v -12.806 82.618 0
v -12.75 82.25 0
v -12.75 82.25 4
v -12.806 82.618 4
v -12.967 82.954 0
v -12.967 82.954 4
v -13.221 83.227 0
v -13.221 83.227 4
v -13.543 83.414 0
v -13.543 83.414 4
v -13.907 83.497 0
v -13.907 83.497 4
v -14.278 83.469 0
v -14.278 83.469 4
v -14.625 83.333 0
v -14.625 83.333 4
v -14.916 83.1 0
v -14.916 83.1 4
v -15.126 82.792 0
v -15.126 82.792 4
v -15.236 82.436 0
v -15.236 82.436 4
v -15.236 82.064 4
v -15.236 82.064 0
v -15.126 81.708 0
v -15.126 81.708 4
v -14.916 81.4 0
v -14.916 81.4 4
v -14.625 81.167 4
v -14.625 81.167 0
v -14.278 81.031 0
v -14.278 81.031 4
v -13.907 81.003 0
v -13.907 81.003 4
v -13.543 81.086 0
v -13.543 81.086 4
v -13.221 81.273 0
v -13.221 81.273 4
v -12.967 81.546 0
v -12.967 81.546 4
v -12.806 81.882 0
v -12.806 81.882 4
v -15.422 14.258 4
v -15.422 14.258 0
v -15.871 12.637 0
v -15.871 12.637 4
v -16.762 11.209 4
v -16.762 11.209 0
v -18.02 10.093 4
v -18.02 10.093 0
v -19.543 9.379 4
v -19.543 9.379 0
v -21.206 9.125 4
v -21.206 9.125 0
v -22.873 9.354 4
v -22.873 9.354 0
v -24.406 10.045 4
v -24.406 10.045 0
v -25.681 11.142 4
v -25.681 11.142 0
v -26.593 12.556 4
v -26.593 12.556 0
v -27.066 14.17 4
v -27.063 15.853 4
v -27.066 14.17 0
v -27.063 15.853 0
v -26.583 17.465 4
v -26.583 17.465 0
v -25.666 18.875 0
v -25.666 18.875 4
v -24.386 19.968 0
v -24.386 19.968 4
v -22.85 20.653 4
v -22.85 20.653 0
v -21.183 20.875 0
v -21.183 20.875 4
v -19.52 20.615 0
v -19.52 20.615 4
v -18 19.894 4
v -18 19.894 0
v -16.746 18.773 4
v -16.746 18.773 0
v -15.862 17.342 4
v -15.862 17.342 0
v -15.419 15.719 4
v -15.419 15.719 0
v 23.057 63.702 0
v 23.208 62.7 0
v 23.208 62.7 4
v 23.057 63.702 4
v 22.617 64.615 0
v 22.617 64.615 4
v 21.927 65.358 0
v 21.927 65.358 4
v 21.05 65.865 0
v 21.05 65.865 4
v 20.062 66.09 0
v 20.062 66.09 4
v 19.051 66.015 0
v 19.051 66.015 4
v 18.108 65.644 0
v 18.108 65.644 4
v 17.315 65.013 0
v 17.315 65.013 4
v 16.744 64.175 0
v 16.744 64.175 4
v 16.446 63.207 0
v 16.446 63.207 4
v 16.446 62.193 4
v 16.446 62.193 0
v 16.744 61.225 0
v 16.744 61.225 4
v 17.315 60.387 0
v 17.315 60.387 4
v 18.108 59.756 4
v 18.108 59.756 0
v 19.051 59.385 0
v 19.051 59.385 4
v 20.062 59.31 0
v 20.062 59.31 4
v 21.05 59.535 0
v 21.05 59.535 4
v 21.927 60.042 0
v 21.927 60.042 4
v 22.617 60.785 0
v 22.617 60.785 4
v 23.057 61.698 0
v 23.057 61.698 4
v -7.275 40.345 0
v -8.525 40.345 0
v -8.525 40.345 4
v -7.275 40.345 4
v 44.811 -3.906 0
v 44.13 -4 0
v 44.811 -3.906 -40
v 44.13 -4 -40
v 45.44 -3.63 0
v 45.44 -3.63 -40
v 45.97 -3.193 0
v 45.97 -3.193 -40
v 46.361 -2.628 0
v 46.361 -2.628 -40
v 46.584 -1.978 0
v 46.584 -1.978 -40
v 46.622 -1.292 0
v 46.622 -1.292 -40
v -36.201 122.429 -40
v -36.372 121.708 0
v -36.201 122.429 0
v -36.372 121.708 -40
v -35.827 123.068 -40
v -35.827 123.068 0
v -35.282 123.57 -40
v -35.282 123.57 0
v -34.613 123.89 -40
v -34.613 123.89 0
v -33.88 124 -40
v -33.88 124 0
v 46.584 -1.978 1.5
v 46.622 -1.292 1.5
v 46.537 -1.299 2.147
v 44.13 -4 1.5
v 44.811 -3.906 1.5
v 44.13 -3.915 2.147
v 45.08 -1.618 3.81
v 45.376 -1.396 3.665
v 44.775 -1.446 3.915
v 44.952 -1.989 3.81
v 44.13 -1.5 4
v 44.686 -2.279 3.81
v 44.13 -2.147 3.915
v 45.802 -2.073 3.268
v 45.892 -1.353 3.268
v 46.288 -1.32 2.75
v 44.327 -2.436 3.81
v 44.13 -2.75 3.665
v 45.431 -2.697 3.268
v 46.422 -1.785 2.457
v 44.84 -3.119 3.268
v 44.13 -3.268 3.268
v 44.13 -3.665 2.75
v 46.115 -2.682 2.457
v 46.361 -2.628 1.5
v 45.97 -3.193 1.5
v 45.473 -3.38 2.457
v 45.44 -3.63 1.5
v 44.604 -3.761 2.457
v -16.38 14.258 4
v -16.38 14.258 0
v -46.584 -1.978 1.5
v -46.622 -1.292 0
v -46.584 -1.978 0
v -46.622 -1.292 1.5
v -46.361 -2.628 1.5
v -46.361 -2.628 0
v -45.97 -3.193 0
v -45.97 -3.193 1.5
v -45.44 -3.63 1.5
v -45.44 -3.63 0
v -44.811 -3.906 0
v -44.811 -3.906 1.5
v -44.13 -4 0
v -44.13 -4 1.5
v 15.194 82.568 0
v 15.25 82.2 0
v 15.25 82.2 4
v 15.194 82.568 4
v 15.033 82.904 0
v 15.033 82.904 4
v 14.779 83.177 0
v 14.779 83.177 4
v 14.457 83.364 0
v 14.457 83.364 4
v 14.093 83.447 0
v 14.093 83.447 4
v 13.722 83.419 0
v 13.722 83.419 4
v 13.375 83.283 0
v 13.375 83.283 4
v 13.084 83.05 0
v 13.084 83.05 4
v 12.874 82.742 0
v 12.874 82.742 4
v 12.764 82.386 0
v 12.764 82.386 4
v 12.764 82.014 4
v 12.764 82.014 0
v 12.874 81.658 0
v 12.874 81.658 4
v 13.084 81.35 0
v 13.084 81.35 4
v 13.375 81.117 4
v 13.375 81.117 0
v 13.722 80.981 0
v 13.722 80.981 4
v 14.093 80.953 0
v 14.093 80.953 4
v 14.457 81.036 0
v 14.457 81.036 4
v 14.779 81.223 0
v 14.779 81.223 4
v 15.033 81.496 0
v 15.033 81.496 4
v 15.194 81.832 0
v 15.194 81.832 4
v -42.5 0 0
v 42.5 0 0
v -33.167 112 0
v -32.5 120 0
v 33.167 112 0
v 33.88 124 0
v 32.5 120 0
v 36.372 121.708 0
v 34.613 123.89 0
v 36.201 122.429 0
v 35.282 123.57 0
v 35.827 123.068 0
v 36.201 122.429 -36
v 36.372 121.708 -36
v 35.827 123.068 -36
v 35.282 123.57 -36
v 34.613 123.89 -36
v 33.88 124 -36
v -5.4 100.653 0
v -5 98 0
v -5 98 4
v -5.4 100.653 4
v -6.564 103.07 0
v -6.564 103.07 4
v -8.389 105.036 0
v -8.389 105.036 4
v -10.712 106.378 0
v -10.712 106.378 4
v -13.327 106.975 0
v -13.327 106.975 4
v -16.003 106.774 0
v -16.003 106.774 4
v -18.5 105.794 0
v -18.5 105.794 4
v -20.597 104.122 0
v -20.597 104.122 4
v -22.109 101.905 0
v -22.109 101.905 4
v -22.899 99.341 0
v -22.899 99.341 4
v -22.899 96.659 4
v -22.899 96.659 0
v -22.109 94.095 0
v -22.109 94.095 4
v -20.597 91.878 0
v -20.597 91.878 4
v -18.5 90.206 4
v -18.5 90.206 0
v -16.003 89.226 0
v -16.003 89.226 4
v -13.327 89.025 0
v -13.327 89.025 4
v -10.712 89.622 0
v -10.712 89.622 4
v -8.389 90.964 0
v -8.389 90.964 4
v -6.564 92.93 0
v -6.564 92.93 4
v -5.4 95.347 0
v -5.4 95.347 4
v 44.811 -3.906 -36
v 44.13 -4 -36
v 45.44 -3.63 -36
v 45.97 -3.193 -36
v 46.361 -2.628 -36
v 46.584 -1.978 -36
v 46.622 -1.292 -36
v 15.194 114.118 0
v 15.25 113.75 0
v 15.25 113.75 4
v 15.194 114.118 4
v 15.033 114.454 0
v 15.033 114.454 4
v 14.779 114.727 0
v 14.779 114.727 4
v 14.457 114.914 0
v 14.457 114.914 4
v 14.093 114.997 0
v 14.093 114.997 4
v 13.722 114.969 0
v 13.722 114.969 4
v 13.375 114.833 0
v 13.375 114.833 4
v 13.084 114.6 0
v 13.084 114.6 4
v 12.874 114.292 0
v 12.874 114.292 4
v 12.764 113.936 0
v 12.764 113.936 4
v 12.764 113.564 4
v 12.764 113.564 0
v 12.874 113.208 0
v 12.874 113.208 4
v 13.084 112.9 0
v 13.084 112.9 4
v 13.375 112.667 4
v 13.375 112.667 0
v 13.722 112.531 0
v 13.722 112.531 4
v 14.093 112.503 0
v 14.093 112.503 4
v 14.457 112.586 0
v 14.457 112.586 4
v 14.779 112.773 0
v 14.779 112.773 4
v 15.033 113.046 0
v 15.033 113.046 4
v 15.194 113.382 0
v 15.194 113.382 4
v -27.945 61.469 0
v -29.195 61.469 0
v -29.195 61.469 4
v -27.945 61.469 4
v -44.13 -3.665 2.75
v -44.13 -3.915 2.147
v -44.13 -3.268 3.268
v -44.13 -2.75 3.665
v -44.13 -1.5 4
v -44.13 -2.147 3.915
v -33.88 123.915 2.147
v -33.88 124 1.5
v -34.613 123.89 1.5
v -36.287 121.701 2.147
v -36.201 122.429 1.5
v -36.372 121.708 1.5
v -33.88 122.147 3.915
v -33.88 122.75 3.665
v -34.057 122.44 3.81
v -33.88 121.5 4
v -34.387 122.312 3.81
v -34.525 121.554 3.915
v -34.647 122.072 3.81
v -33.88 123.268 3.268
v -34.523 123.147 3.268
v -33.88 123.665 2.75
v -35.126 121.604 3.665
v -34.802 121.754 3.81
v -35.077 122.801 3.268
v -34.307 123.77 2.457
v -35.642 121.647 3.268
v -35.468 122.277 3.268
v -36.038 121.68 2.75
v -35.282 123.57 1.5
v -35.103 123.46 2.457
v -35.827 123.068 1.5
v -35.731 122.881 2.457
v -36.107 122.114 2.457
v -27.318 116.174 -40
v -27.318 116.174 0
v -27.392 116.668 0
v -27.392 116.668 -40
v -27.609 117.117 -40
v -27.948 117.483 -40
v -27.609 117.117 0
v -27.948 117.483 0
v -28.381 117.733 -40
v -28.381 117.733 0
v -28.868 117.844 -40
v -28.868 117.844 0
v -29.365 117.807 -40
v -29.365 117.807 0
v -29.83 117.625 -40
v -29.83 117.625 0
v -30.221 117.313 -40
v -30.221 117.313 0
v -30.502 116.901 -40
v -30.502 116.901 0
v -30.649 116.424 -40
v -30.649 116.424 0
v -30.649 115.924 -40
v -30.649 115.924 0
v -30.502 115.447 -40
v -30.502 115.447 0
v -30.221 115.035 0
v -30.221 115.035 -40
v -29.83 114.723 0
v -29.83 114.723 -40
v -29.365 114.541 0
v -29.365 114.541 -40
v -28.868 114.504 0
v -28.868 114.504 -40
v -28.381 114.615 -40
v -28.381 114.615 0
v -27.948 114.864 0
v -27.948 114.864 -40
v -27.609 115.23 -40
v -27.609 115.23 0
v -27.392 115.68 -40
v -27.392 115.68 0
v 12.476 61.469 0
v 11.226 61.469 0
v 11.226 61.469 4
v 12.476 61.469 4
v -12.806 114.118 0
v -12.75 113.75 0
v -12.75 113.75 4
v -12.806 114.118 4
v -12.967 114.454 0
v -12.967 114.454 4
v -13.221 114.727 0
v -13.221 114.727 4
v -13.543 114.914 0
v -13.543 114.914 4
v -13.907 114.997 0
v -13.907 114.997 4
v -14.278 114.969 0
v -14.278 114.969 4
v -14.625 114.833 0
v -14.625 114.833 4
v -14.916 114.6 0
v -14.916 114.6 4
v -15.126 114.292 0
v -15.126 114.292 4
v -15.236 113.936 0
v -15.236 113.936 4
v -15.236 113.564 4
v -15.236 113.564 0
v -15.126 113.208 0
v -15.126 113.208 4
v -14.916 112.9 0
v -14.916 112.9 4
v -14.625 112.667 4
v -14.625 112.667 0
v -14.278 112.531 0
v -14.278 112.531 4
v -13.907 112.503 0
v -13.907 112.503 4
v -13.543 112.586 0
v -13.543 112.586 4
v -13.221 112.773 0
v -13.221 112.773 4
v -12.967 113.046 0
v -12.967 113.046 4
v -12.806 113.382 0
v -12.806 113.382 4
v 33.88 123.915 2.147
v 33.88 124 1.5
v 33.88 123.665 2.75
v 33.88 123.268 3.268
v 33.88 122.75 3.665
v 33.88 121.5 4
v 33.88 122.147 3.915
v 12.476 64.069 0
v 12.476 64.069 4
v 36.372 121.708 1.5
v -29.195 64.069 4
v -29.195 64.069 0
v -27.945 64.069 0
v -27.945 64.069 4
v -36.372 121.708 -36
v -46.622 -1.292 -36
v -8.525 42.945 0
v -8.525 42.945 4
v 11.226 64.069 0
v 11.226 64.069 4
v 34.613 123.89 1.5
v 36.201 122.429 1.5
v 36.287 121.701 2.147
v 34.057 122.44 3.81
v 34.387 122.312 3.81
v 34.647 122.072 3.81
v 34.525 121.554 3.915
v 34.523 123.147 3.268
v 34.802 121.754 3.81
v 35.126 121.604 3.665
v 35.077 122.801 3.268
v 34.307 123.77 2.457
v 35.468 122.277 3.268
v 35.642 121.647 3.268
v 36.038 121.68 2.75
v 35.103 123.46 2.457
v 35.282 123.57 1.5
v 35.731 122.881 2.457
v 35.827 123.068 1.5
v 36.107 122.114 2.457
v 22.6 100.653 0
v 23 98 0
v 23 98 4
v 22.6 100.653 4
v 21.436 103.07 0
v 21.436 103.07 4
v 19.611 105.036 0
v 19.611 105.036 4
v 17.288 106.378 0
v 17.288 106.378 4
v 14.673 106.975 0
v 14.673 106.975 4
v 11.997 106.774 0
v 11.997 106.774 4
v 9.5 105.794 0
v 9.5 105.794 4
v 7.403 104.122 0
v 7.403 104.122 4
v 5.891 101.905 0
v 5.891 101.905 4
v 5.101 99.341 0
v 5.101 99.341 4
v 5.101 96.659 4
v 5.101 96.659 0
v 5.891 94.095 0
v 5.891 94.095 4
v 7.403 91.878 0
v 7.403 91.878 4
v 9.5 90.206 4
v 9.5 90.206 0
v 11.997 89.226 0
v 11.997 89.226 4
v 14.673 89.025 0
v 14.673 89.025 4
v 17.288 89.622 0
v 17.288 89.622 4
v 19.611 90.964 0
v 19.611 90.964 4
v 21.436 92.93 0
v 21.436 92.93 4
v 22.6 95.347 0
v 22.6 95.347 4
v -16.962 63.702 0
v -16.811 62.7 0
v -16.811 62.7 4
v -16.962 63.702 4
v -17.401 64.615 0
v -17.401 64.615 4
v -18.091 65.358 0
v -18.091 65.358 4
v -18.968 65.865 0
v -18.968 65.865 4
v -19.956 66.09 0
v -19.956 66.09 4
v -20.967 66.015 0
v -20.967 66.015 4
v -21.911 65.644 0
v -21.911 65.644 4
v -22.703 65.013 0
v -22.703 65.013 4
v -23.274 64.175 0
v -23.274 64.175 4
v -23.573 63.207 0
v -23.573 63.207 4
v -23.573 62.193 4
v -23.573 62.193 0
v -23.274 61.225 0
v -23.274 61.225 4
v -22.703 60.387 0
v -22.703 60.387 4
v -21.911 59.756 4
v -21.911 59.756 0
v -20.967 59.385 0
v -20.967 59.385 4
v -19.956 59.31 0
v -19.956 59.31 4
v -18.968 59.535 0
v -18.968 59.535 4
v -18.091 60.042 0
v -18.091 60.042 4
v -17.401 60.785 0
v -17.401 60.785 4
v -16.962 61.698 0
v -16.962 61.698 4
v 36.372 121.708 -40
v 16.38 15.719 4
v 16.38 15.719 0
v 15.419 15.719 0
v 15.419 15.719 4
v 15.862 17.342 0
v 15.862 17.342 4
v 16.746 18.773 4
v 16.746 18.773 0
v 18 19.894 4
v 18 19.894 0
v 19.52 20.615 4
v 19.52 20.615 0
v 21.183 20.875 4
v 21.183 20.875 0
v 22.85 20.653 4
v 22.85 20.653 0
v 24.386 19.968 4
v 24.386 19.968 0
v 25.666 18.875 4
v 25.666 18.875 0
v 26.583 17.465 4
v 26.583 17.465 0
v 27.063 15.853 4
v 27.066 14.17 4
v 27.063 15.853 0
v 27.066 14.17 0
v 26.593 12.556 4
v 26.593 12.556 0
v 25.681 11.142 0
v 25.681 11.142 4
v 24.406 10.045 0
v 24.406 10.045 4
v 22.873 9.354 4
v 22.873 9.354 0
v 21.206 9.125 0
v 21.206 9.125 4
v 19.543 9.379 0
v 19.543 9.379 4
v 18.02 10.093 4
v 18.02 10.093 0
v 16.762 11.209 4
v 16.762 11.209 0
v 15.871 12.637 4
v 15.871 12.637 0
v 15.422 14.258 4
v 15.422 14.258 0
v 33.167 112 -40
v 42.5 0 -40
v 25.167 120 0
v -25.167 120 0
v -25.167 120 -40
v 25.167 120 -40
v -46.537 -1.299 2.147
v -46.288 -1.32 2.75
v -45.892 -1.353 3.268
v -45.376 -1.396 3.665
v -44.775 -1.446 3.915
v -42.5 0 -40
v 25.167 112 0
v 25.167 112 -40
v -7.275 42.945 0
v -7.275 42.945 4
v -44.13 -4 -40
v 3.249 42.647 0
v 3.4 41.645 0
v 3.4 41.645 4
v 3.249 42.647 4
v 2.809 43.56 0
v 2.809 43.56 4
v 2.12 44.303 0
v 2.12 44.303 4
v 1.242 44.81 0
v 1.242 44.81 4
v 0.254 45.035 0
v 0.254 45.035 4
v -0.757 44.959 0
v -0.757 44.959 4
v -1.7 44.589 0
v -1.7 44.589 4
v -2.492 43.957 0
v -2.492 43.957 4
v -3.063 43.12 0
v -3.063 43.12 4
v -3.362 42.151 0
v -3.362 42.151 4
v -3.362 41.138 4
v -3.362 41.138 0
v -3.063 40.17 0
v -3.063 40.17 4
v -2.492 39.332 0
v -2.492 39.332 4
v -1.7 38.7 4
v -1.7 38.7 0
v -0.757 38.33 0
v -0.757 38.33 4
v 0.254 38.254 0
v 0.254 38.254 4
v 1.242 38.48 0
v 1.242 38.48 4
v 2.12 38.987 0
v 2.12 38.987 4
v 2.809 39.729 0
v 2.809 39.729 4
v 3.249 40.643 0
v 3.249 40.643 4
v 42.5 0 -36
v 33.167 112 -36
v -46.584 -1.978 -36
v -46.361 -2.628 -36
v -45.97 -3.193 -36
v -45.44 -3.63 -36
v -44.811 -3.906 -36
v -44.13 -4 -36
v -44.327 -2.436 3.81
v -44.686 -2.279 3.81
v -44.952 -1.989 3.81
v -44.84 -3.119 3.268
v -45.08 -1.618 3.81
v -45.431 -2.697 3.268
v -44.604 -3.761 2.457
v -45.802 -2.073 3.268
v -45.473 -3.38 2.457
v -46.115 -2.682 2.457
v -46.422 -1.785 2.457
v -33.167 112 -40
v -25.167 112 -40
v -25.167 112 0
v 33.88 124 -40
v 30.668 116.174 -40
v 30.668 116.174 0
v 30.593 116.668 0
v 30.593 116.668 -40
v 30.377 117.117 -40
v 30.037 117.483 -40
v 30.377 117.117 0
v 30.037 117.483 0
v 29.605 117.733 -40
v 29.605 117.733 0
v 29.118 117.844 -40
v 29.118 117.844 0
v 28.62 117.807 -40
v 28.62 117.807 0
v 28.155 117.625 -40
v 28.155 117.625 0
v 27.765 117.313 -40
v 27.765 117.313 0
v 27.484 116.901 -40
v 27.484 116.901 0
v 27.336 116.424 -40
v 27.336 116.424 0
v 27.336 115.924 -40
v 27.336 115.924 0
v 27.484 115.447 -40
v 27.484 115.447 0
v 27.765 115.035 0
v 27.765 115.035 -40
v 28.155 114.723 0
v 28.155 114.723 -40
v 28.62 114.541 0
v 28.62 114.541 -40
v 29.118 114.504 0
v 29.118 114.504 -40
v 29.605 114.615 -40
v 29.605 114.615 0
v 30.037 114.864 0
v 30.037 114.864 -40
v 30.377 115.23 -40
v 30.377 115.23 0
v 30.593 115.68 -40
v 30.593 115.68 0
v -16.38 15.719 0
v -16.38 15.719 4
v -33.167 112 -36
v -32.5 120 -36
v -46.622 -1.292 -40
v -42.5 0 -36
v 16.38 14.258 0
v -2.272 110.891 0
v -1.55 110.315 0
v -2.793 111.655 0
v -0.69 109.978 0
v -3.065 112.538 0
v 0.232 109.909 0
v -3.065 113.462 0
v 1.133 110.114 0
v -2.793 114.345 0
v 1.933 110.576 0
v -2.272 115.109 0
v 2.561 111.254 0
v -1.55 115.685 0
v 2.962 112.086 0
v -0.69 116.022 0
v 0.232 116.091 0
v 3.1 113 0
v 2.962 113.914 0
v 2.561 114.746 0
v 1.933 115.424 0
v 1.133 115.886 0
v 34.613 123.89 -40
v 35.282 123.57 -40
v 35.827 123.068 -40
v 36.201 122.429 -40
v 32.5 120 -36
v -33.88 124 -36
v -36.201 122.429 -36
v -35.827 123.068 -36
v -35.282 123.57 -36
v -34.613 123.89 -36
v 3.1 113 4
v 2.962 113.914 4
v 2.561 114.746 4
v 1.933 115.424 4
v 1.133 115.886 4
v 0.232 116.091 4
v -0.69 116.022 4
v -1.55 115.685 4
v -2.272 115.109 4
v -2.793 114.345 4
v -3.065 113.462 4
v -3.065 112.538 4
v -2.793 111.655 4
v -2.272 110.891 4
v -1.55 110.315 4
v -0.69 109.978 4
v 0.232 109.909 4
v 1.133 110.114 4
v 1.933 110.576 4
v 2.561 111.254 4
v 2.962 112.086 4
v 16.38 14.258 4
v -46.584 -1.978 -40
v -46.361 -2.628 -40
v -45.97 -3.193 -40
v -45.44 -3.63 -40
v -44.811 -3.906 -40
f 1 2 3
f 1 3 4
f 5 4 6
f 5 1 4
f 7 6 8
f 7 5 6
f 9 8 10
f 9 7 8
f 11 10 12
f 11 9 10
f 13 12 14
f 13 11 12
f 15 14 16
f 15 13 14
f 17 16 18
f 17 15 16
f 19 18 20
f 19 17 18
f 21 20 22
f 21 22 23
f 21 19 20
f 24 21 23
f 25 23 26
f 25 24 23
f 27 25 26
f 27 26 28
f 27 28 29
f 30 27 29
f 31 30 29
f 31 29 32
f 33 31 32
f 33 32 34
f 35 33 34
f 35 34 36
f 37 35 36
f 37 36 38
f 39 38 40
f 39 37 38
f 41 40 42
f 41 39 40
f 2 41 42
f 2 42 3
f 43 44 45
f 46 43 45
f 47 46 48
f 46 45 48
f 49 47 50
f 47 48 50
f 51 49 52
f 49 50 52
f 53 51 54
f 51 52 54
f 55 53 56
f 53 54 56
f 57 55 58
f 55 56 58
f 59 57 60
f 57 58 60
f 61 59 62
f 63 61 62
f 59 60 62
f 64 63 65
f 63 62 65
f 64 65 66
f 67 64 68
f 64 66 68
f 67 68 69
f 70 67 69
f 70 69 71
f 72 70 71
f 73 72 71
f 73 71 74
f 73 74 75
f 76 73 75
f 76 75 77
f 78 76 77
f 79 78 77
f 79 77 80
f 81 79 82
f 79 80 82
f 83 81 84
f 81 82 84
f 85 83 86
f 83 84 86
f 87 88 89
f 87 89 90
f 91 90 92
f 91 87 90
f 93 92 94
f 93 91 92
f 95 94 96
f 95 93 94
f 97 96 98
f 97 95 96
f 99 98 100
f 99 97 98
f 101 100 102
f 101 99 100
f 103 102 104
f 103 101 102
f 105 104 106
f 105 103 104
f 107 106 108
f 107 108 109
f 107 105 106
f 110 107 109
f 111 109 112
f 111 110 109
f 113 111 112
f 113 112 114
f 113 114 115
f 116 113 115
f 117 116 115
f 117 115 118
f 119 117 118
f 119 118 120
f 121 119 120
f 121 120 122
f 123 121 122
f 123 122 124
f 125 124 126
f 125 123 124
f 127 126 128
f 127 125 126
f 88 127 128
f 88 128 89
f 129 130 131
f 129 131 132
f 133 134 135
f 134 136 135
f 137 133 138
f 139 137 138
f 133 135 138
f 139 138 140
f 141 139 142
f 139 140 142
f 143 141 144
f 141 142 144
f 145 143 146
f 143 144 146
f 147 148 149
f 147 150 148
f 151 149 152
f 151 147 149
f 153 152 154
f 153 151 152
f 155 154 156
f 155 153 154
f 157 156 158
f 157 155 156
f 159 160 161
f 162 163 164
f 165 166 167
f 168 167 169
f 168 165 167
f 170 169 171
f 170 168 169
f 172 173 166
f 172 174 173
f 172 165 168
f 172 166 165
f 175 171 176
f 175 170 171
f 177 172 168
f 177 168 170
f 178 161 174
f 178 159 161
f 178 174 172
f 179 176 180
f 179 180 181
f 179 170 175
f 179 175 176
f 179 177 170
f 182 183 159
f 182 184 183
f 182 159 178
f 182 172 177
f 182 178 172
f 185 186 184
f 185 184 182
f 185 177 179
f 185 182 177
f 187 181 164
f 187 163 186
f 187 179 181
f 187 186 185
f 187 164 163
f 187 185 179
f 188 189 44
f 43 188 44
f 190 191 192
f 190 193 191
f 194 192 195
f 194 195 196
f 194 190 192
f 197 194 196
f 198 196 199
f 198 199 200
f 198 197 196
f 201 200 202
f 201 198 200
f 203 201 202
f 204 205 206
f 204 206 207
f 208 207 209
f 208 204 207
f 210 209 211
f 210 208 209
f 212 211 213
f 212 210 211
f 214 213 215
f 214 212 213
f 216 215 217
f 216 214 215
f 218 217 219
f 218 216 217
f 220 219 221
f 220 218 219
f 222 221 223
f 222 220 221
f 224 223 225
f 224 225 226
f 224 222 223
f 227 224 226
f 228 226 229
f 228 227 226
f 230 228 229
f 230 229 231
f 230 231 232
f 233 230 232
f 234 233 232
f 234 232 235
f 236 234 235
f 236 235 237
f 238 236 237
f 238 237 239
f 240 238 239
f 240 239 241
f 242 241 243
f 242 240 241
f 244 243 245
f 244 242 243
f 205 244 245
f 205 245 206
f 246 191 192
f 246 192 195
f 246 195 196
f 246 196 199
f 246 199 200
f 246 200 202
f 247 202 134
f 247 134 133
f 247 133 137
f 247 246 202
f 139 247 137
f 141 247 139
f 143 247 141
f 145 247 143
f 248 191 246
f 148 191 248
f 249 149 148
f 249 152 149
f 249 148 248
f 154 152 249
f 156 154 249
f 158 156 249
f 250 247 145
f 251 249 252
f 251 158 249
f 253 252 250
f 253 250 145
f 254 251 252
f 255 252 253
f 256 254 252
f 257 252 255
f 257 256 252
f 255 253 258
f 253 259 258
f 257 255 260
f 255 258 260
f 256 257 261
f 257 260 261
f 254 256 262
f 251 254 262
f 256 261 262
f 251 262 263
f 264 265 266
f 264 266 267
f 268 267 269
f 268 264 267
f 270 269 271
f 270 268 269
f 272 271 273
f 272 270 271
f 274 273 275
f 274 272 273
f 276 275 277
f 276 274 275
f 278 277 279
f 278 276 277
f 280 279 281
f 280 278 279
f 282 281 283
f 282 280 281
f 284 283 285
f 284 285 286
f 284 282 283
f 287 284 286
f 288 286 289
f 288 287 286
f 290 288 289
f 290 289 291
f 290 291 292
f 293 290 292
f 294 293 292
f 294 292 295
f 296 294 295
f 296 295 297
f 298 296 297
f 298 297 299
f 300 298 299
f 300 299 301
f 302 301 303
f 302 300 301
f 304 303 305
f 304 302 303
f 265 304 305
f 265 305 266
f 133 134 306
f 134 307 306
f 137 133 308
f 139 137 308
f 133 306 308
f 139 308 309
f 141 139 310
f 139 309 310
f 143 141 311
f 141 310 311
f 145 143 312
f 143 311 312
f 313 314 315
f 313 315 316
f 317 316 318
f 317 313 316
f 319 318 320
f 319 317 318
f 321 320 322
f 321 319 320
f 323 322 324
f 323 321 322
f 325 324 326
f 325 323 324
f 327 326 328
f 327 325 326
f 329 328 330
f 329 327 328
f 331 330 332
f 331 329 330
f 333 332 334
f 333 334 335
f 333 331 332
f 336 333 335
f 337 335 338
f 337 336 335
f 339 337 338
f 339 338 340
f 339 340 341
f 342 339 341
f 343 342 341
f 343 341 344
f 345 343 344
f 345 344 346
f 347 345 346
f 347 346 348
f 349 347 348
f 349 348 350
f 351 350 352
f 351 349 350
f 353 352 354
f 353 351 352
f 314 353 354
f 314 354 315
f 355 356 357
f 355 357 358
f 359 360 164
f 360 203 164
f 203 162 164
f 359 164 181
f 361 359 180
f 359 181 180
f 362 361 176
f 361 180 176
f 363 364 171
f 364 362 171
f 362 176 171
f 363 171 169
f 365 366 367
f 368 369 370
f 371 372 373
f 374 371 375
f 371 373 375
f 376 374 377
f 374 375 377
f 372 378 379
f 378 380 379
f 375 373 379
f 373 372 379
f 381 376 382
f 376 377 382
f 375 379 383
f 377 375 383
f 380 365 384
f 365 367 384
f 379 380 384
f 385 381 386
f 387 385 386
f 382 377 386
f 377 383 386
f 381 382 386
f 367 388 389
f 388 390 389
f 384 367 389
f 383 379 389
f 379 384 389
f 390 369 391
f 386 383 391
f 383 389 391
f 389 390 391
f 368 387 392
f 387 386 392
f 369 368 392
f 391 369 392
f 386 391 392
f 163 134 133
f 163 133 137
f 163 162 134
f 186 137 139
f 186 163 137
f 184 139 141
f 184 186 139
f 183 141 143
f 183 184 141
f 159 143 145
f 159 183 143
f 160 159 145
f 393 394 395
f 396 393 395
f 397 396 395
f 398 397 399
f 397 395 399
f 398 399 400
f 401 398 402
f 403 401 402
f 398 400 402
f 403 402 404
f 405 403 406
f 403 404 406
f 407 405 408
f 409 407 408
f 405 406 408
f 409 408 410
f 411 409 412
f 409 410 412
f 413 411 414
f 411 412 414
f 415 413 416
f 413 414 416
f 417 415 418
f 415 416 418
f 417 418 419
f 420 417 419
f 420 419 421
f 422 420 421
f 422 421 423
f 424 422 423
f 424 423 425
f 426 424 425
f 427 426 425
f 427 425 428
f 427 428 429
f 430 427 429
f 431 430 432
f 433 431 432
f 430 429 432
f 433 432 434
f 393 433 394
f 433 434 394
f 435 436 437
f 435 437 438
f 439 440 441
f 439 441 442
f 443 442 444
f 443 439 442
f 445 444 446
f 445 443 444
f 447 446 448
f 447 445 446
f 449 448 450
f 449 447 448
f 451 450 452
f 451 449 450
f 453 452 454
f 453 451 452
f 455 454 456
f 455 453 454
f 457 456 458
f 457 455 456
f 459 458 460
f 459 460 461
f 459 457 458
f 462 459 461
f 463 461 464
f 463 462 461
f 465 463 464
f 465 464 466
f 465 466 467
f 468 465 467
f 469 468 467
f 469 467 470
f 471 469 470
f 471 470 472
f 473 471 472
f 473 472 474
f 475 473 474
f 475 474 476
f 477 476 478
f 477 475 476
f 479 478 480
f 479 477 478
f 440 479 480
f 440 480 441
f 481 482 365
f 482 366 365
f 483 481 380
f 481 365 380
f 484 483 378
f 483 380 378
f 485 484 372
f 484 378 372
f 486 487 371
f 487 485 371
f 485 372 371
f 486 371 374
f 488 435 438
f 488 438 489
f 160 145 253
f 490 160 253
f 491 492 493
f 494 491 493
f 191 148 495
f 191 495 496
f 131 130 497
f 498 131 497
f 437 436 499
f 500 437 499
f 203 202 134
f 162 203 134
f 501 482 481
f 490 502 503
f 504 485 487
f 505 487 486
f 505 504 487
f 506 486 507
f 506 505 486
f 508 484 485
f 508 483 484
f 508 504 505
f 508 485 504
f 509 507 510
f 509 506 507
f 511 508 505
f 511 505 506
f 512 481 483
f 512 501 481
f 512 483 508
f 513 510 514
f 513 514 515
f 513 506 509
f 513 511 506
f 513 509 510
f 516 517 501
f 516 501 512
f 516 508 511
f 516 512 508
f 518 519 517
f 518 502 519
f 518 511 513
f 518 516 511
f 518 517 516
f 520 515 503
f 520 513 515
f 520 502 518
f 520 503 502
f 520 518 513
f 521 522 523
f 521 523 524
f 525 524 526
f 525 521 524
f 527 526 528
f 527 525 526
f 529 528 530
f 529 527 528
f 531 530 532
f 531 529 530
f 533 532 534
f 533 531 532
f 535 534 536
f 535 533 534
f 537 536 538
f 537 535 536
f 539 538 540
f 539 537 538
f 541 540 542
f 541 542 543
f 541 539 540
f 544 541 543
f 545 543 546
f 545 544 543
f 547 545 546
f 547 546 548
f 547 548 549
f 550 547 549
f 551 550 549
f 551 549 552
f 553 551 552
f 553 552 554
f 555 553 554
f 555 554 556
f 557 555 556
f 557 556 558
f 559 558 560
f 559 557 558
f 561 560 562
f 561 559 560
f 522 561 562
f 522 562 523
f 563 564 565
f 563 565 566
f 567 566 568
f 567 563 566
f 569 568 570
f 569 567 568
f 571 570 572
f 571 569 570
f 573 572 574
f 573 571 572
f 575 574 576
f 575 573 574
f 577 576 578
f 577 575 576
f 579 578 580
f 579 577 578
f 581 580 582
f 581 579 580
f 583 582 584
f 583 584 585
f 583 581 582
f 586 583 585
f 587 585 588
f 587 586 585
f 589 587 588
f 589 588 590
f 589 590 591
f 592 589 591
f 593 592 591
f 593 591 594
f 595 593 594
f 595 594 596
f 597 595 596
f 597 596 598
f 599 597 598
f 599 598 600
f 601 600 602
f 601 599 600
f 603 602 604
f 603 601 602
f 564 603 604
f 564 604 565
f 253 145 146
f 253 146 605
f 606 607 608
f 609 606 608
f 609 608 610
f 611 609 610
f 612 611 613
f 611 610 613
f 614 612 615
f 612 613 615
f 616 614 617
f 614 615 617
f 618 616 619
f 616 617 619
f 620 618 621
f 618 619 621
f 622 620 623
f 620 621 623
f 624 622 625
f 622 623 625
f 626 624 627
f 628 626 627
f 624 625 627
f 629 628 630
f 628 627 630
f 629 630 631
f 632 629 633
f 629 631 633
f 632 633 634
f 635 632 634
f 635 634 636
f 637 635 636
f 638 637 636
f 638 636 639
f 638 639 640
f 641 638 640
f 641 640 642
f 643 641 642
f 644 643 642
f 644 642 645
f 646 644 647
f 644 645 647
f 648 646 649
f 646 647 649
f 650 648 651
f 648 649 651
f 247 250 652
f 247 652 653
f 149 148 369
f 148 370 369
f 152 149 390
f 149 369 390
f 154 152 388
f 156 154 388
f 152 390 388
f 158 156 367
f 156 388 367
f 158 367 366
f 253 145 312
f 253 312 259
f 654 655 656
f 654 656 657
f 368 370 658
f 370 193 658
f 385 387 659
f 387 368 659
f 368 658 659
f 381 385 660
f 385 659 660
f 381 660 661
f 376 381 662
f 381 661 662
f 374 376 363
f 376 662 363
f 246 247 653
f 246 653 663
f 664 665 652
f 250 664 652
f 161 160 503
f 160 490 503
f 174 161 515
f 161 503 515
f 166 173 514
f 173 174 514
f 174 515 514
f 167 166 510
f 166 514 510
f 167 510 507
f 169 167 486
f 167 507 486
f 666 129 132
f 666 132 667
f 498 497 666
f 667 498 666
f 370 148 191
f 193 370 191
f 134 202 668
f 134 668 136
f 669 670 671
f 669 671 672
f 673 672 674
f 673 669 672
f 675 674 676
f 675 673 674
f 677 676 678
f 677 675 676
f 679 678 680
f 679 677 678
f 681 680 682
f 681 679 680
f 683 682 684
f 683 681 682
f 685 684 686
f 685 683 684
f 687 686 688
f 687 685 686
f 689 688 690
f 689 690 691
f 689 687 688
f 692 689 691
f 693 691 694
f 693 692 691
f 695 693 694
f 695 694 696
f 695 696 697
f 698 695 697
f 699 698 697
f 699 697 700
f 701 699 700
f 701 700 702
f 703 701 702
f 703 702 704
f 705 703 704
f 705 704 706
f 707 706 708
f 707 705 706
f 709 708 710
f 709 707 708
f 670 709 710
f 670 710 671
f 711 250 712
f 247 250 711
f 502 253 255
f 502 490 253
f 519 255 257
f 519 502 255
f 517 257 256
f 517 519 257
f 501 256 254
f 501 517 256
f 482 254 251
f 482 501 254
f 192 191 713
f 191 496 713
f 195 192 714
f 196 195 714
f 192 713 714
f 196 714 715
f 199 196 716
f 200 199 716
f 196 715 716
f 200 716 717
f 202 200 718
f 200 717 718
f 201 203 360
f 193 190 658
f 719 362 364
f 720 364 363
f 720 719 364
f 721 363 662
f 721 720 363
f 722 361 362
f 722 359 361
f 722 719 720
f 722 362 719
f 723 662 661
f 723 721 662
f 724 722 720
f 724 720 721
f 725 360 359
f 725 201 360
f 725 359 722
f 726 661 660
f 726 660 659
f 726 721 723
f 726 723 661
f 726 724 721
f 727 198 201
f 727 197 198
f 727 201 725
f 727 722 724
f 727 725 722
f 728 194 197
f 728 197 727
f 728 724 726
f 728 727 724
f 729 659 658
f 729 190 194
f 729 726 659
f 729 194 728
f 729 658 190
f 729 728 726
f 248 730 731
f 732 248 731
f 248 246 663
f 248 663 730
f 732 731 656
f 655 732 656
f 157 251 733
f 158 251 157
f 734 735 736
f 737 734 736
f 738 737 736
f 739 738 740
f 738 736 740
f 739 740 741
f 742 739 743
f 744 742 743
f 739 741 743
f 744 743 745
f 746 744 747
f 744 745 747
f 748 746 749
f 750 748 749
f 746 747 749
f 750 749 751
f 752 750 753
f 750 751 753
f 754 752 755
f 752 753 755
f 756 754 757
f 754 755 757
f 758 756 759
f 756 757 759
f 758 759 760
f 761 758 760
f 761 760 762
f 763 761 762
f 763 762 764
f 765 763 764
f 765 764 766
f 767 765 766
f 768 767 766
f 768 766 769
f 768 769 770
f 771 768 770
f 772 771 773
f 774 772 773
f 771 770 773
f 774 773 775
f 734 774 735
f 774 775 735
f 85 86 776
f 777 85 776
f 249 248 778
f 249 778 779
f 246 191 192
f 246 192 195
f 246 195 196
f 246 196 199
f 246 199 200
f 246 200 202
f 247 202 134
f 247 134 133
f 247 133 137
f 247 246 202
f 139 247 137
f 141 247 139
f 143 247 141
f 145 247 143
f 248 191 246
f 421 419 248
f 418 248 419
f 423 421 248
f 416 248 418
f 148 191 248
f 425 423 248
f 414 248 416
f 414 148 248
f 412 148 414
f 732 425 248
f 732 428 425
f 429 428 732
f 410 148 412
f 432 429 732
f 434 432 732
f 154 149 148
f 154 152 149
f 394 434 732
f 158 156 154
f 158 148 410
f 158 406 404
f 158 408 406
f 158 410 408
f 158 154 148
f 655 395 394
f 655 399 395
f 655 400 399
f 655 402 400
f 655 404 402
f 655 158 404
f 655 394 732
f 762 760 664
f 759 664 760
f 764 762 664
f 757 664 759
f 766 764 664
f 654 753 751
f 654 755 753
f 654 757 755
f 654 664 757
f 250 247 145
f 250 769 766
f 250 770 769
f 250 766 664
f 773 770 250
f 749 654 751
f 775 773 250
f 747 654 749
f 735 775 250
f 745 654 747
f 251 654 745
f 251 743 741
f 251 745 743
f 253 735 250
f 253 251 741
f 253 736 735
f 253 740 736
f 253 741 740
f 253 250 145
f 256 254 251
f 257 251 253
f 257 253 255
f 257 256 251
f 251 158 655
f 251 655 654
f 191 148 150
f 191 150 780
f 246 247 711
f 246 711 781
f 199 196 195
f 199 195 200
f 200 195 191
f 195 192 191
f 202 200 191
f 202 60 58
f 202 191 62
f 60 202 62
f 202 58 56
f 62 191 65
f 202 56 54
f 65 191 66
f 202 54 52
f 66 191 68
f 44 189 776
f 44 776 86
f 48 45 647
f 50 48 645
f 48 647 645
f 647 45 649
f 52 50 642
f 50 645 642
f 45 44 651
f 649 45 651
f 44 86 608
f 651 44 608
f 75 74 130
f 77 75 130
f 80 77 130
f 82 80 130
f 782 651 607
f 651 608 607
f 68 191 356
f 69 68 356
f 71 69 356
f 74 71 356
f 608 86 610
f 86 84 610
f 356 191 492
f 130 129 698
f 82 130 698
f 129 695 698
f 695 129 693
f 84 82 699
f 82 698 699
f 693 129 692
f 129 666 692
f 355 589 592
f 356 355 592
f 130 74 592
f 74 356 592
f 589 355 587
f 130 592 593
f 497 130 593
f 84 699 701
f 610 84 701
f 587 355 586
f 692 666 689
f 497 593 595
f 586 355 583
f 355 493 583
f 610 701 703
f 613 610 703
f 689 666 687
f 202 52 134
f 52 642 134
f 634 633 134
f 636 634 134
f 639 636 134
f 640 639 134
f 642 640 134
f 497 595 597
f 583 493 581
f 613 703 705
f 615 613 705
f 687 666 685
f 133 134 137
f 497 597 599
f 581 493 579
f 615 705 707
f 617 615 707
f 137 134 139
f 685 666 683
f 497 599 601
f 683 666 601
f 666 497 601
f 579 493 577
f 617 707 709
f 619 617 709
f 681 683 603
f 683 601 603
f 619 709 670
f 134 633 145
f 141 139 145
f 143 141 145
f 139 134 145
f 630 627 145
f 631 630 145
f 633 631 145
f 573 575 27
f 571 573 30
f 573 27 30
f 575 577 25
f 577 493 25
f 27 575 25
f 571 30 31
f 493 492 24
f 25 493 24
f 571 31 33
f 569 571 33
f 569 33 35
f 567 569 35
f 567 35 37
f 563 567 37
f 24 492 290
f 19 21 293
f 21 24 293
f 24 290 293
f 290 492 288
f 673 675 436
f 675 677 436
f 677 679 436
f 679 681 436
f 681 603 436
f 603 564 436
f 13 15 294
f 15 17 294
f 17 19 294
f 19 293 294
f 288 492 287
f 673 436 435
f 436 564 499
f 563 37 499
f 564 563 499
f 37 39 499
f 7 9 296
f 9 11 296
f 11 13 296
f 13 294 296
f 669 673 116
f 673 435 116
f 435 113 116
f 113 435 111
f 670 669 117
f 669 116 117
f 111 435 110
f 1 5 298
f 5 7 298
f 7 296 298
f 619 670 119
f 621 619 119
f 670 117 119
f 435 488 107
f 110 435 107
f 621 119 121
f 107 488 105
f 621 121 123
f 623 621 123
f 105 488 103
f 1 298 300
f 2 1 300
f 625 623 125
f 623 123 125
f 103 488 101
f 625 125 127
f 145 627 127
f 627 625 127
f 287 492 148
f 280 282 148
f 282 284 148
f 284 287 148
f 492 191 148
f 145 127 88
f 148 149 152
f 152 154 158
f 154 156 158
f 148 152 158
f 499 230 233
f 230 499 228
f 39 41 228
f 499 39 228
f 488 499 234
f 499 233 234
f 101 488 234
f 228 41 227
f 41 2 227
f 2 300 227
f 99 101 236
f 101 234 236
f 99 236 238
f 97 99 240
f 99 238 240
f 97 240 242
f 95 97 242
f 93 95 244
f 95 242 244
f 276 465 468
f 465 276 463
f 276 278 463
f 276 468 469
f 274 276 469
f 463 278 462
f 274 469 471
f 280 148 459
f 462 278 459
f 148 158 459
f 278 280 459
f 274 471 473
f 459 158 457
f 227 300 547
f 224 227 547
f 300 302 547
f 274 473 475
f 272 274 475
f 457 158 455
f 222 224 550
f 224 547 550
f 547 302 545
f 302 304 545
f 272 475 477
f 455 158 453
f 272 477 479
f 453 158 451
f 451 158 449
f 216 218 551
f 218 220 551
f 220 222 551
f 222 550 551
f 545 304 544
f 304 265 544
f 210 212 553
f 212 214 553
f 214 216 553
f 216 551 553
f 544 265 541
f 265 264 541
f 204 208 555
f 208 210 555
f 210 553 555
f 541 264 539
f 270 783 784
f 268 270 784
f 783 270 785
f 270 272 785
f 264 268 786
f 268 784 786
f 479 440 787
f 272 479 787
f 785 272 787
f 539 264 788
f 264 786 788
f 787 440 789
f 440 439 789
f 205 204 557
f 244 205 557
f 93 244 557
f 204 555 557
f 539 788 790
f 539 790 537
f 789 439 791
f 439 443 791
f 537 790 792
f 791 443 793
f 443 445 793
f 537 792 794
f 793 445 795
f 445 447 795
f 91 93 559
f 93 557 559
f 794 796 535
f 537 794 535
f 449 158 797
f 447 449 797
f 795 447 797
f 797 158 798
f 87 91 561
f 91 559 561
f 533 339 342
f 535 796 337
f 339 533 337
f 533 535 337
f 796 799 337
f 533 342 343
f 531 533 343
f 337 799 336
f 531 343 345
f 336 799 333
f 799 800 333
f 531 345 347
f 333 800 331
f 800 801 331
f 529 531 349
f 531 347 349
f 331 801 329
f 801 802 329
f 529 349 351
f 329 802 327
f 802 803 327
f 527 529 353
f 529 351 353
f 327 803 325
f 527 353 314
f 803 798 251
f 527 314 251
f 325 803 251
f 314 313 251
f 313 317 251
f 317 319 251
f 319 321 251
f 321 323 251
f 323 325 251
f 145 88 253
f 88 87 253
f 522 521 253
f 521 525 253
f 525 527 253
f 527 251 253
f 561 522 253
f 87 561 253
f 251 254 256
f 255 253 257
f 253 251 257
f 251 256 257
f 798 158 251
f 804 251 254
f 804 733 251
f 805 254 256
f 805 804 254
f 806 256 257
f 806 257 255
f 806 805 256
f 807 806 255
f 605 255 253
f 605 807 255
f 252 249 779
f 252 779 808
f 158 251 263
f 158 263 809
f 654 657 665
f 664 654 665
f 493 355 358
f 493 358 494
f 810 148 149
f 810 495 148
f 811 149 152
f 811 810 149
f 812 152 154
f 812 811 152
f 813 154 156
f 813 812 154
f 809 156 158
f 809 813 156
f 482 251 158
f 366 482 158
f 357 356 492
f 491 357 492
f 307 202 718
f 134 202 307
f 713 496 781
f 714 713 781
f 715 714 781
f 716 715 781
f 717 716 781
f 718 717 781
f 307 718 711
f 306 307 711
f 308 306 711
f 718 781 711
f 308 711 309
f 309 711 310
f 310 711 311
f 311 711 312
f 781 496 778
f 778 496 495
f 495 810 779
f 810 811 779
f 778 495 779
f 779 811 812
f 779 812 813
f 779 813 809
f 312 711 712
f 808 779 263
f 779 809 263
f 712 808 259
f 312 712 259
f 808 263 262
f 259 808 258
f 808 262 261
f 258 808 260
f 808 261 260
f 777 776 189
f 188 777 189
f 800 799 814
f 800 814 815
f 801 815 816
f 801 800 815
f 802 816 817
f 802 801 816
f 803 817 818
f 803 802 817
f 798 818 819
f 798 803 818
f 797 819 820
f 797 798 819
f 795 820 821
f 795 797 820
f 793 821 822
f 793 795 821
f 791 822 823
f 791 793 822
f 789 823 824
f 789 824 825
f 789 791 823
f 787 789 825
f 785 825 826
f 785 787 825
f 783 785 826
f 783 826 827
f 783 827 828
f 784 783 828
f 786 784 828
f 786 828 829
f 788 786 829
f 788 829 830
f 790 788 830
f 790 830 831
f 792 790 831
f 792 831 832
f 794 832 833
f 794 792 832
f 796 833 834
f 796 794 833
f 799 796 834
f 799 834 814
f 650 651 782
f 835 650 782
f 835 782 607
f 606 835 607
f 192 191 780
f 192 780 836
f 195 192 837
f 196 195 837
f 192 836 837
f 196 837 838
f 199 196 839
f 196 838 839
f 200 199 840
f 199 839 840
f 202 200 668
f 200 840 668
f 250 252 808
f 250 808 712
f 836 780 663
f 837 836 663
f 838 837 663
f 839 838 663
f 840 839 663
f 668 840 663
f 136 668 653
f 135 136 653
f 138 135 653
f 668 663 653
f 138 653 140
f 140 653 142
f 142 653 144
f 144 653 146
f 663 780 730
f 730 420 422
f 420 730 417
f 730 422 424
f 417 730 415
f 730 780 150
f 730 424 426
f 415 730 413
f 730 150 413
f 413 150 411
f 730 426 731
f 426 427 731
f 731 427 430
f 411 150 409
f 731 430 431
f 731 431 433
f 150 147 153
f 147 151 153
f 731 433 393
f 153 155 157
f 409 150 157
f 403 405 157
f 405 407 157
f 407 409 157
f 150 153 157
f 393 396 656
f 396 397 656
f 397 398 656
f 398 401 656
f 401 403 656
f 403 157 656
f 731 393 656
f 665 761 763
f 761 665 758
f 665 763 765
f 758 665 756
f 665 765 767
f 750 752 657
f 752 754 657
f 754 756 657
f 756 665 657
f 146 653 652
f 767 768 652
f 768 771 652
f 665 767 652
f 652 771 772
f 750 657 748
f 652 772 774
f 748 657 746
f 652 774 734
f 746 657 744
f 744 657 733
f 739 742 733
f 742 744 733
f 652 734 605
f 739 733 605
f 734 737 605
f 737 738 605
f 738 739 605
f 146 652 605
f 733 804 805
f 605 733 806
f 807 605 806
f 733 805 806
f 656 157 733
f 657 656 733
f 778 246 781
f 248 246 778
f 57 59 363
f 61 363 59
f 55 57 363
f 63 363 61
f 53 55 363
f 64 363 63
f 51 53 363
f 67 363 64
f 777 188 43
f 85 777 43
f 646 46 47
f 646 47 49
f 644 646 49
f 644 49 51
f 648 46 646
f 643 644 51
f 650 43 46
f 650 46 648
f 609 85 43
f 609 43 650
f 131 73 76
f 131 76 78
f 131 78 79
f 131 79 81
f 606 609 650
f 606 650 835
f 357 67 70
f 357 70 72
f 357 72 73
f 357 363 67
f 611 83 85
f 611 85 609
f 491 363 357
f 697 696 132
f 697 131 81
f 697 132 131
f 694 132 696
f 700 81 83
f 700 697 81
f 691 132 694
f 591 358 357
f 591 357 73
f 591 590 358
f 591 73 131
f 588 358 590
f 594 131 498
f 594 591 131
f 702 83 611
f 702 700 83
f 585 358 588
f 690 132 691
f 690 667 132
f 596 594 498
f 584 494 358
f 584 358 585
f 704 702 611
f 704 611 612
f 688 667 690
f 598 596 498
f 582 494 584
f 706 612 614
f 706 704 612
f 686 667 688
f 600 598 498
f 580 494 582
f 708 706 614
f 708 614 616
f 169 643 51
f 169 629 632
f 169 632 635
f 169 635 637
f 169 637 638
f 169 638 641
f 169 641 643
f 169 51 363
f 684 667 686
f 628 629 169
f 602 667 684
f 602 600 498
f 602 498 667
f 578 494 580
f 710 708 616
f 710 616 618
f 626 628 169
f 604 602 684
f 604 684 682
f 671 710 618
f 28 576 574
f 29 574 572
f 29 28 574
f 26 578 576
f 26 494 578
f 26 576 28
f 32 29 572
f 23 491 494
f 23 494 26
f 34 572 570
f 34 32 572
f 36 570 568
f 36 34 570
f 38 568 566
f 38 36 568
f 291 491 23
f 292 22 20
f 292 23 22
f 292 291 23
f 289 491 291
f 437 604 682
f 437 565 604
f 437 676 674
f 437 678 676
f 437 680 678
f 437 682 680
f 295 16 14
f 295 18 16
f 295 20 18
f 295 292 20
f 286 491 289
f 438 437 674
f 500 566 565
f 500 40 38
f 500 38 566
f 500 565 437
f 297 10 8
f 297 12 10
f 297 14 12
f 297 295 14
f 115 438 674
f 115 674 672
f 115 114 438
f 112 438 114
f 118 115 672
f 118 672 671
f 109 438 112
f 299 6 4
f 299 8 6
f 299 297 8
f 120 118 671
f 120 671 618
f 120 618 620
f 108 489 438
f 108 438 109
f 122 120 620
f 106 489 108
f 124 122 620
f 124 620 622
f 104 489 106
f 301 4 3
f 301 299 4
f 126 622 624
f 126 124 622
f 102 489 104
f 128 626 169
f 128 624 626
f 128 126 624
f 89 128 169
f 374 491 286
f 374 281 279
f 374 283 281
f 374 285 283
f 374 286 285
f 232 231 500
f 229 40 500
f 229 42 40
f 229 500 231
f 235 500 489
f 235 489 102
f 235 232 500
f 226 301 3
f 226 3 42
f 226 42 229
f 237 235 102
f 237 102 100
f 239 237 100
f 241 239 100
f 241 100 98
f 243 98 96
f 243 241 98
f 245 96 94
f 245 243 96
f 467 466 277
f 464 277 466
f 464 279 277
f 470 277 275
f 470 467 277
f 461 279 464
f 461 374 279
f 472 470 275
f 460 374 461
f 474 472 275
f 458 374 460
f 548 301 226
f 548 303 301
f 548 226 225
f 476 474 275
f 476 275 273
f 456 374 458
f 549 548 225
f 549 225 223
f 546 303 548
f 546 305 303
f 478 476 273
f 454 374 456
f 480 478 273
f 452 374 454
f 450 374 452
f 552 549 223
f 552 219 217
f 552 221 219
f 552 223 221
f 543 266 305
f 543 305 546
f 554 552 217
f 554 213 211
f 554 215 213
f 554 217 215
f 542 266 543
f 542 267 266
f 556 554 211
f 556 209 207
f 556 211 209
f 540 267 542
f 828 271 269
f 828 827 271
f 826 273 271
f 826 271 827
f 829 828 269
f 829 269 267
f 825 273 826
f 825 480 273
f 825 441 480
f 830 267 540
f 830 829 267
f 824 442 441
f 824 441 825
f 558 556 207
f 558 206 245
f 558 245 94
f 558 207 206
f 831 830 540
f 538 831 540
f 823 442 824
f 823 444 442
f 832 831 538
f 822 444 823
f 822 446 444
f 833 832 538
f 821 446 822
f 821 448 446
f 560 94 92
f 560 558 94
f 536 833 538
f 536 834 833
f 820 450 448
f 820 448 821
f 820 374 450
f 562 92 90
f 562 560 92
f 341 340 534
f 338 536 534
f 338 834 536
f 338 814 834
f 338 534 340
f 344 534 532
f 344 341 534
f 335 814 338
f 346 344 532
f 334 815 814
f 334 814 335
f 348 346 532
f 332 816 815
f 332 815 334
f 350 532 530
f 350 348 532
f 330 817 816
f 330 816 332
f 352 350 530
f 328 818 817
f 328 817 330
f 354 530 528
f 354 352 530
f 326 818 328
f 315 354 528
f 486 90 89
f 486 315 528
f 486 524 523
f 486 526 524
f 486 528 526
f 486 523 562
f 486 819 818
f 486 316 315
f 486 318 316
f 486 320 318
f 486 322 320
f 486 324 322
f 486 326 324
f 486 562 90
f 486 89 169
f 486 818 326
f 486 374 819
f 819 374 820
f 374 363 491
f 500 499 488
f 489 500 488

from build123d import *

# Parameters (mm, degrees)
F1_DEPTH = 36
F0_W     = 1.25
F0_H     = 2.6
F0_R     = 3.4
F0_R_2   = 1.25
F0_R_3   = 9
F0_R_4   = 3.1
F0_R_5   = 1.675
F2_DEPTH = 4
F3_DEPTH = 40
F4_R     = 2.5
F4_2_R   = 2.5
F4_3_R   = 2.5


with BuildPart() as f1:
    # F0 (on Top) → F1 (new body)
    with BuildSketch(Plane.XY):
        Polygon((-36.1805315263, 124), (-46.8471981929, -4), (0, -4), (46.8471981929, -4), (36.1805315263, 124), (0, 124), align=None)
        Polygon((42.5, 0), (0, 0), (-42.5, 0), (-33.1666666667, 112), (-32.5, 120), (-25.1666666667, 120), (25.1666666667, 120), (32.5, 120), (33.1666666667, 112), align=None, mode=Mode.SUBTRACT)
    extrude(amount=-F1_DEPTH)

    # F4#3
    f4_3_edges = [f1.edges().sort_by_distance(p)[0] for p in [
        (-36.180532, 124, -18),
        (-46.847198, -4, -18),
        (46.847198, -4, -18),
        (36.180532, 124, -18),
    ]]
    fillet(f4_3_edges, radius=F4_3_R)


with BuildPart() as f2:
    # F0 (on Top) → F2 (new body)
    with BuildSketch(Plane.XY):
        Polygon((-36.1805315263, 124), (-46.8471981929, -4), (0, -4), (46.8471981929, -4), (36.1805315263, 124), (0, 124), align=None)
        Polygon((42.5, 0), (0, 0), (-42.5, 0), (-33.1666666667, 112), (-32.5, 120), (-25.1666666667, 120), (25.1666666667, 120), (32.5, 120), (33.1666666667, 112), align=None, mode=Mode.SUBTRACT)
        Polygon((-42.5, 0), (0, 0), (42.5, 0), (33.1666666667, 112), (25.1666666667, 112), (25.1666666667, 120), (-25.1666666667, 120), (-25.1666666667, 112), (-33.1666666667, 112), align=None)
        with BuildLine():
            ThreePointArc((-15.4220582608, 14.2578948289), (-27.1249883777, 15.0116859919), (-15.4191521334, 15.7189145684))
            Line((-15.4191521334, 15.7189145684), (-16.3799338043, 15.7189145684))
            Line((-16.3799338043, 15.7189145684), (-16.3799338043, 15))
            Line((-16.3799338043, 15), (-16.3799338043, 14.2578948289))
            Line((-16.3799338043, 14.2578948289), (-15.4220582608, 14.2578948289))
        make_face(mode=Mode.SUBTRACT)
        with Locations((-7.9, 41.6447357833)):
            Rectangle(F0_W, F0_H, mode=Mode.SUBTRACT)
        with Locations((0, 41.6447357833)):
            Circle(F0_R, mode=Mode.SUBTRACT)
        with BuildLine():
            Line((16.3799338043, 15.7189145684), (15.4191521334, 15.7189145684))
            ThreePointArc((15.4191521334, 15.7189145684), (27.1249883777, 15.0116859919), (15.4220582608, 14.2578948289))
            Line((15.4220582608, 14.2578948289), (16.3799338043, 14.2578948289))
            Line((16.3799338043, 14.2578948289), (16.3799338043, 15))
            Line((16.3799338043, 15), (16.3799338043, 15.7189145684))
        make_face(mode=Mode.SUBTRACT)
        with Locations((-28.5701850802, 62.7685887098)):
            Rectangle(F0_W, F0_H, mode=Mode.SUBTRACT)
        with Locations((-20.210525021, 62.7000020444)):
            Circle(F0_R, mode=Mode.SUBTRACT)
        with Locations((-14, 82.25)):
            Circle(F0_R_2, mode=Mode.SUBTRACT)
        with Locations((-14, 98)):
            Circle(F0_R_3, mode=Mode.SUBTRACT)
        with Locations((-14, 113.75)):
            Circle(F0_R_2, mode=Mode.SUBTRACT)
        with Locations((0, 113)):
            Circle(F0_R_4, mode=Mode.SUBTRACT)
        with Locations((11.8508649617, 62.7685887098)):
            Rectangle(F0_W, F0_H, mode=Mode.SUBTRACT)
        with Locations((19.8075663388, 62.7000020444)):
            Circle(F0_R, mode=Mode.SUBTRACT)
        with Locations((14, 82.1999993622)):
            Circle(F0_R_2, mode=Mode.SUBTRACT)
        with Locations((14, 98)):
            Circle(F0_R_3, mode=Mode.SUBTRACT)
        with Locations((14, 113.75)):
            Circle(F0_R_2, mode=Mode.SUBTRACT)
        Polygon((-32.5, 120), (-33.1666666667, 112), (-25.1666666667, 112), (-25.1666666667, 120), align=None)
        with Locations((-28.9927536232, 116.1739130435)):
            Circle(F0_R_5, mode=Mode.SUBTRACT)
        Polygon((25.1666666667, 112), (33.1666666667, 112), (32.5, 120), (25.1666666667, 120), align=None)
        with Locations((28.9927536232, 116.1739130435)):
            Circle(F0_R_5, mode=Mode.SUBTRACT)
        with Locations((28.9927536232, 116.1739130435)):
            Circle(F0_R_5)
        with Locations((-28.9927536232, 116.1739130435)):
            Circle(F0_R_5)
    extrude(amount=F2_DEPTH)

    # F4
    f4_edges = [f2.edges().sort_by_distance(p)[0] for p in [
        (-46.847198, -4, 2),
        (46.847198, -4, 2),
        (-36.180532, 124, 2),
        (36.180532, 124, 2),
        (0, 124, 4),
        (41.513865, 60, 4),
        (0, -4, 4),
        (-41.513865, 60, 4),
    ]]
    fillet(f4_edges, radius=F4_R)


with BuildPart() as f3:
    # F0 (on Top) → F3 (new body)
    with BuildSketch(Plane.XY):
        Polygon((-36.1805315263, 124), (-46.8471981929, -4), (0, -4), (46.8471981929, -4), (36.1805315263, 124), (0, 124), align=None)
        Polygon((42.5, 0), (0, 0), (-42.5, 0), (-33.1666666667, 112), (-32.5, 120), (-25.1666666667, 120), (25.1666666667, 120), (32.5, 120), (33.1666666667, 112), align=None, mode=Mode.SUBTRACT)
        Polygon((25.1666666667, 112), (33.1666666667, 112), (32.5, 120), (25.1666666667, 120), align=None)
        with Locations((28.9927536232, 116.1739130435)):
            Circle(F0_R_5, mode=Mode.SUBTRACT)
        Polygon((-32.5, 120), (-33.1666666667, 112), (-25.1666666667, 112), (-25.1666666667, 120), align=None)
        with Locations((-28.9927536232, 116.1739130435)):
            Circle(F0_R_5, mode=Mode.SUBTRACT)
    extrude(amount=-F3_DEPTH)

    # F4#2
    f4_2_edges = [f3.edges().sort_by_distance(p)[0] for p in [
        (-46.847198, -4, -20),
        (46.847198, -4, -20),
        (-36.180532, 124, -20),
        (36.180532, 124, -20),
    ]]
    fillet(f4_2_edges, radius=F4_2_R)


solid = Compound([f1.part, f2.part, f3.part])
